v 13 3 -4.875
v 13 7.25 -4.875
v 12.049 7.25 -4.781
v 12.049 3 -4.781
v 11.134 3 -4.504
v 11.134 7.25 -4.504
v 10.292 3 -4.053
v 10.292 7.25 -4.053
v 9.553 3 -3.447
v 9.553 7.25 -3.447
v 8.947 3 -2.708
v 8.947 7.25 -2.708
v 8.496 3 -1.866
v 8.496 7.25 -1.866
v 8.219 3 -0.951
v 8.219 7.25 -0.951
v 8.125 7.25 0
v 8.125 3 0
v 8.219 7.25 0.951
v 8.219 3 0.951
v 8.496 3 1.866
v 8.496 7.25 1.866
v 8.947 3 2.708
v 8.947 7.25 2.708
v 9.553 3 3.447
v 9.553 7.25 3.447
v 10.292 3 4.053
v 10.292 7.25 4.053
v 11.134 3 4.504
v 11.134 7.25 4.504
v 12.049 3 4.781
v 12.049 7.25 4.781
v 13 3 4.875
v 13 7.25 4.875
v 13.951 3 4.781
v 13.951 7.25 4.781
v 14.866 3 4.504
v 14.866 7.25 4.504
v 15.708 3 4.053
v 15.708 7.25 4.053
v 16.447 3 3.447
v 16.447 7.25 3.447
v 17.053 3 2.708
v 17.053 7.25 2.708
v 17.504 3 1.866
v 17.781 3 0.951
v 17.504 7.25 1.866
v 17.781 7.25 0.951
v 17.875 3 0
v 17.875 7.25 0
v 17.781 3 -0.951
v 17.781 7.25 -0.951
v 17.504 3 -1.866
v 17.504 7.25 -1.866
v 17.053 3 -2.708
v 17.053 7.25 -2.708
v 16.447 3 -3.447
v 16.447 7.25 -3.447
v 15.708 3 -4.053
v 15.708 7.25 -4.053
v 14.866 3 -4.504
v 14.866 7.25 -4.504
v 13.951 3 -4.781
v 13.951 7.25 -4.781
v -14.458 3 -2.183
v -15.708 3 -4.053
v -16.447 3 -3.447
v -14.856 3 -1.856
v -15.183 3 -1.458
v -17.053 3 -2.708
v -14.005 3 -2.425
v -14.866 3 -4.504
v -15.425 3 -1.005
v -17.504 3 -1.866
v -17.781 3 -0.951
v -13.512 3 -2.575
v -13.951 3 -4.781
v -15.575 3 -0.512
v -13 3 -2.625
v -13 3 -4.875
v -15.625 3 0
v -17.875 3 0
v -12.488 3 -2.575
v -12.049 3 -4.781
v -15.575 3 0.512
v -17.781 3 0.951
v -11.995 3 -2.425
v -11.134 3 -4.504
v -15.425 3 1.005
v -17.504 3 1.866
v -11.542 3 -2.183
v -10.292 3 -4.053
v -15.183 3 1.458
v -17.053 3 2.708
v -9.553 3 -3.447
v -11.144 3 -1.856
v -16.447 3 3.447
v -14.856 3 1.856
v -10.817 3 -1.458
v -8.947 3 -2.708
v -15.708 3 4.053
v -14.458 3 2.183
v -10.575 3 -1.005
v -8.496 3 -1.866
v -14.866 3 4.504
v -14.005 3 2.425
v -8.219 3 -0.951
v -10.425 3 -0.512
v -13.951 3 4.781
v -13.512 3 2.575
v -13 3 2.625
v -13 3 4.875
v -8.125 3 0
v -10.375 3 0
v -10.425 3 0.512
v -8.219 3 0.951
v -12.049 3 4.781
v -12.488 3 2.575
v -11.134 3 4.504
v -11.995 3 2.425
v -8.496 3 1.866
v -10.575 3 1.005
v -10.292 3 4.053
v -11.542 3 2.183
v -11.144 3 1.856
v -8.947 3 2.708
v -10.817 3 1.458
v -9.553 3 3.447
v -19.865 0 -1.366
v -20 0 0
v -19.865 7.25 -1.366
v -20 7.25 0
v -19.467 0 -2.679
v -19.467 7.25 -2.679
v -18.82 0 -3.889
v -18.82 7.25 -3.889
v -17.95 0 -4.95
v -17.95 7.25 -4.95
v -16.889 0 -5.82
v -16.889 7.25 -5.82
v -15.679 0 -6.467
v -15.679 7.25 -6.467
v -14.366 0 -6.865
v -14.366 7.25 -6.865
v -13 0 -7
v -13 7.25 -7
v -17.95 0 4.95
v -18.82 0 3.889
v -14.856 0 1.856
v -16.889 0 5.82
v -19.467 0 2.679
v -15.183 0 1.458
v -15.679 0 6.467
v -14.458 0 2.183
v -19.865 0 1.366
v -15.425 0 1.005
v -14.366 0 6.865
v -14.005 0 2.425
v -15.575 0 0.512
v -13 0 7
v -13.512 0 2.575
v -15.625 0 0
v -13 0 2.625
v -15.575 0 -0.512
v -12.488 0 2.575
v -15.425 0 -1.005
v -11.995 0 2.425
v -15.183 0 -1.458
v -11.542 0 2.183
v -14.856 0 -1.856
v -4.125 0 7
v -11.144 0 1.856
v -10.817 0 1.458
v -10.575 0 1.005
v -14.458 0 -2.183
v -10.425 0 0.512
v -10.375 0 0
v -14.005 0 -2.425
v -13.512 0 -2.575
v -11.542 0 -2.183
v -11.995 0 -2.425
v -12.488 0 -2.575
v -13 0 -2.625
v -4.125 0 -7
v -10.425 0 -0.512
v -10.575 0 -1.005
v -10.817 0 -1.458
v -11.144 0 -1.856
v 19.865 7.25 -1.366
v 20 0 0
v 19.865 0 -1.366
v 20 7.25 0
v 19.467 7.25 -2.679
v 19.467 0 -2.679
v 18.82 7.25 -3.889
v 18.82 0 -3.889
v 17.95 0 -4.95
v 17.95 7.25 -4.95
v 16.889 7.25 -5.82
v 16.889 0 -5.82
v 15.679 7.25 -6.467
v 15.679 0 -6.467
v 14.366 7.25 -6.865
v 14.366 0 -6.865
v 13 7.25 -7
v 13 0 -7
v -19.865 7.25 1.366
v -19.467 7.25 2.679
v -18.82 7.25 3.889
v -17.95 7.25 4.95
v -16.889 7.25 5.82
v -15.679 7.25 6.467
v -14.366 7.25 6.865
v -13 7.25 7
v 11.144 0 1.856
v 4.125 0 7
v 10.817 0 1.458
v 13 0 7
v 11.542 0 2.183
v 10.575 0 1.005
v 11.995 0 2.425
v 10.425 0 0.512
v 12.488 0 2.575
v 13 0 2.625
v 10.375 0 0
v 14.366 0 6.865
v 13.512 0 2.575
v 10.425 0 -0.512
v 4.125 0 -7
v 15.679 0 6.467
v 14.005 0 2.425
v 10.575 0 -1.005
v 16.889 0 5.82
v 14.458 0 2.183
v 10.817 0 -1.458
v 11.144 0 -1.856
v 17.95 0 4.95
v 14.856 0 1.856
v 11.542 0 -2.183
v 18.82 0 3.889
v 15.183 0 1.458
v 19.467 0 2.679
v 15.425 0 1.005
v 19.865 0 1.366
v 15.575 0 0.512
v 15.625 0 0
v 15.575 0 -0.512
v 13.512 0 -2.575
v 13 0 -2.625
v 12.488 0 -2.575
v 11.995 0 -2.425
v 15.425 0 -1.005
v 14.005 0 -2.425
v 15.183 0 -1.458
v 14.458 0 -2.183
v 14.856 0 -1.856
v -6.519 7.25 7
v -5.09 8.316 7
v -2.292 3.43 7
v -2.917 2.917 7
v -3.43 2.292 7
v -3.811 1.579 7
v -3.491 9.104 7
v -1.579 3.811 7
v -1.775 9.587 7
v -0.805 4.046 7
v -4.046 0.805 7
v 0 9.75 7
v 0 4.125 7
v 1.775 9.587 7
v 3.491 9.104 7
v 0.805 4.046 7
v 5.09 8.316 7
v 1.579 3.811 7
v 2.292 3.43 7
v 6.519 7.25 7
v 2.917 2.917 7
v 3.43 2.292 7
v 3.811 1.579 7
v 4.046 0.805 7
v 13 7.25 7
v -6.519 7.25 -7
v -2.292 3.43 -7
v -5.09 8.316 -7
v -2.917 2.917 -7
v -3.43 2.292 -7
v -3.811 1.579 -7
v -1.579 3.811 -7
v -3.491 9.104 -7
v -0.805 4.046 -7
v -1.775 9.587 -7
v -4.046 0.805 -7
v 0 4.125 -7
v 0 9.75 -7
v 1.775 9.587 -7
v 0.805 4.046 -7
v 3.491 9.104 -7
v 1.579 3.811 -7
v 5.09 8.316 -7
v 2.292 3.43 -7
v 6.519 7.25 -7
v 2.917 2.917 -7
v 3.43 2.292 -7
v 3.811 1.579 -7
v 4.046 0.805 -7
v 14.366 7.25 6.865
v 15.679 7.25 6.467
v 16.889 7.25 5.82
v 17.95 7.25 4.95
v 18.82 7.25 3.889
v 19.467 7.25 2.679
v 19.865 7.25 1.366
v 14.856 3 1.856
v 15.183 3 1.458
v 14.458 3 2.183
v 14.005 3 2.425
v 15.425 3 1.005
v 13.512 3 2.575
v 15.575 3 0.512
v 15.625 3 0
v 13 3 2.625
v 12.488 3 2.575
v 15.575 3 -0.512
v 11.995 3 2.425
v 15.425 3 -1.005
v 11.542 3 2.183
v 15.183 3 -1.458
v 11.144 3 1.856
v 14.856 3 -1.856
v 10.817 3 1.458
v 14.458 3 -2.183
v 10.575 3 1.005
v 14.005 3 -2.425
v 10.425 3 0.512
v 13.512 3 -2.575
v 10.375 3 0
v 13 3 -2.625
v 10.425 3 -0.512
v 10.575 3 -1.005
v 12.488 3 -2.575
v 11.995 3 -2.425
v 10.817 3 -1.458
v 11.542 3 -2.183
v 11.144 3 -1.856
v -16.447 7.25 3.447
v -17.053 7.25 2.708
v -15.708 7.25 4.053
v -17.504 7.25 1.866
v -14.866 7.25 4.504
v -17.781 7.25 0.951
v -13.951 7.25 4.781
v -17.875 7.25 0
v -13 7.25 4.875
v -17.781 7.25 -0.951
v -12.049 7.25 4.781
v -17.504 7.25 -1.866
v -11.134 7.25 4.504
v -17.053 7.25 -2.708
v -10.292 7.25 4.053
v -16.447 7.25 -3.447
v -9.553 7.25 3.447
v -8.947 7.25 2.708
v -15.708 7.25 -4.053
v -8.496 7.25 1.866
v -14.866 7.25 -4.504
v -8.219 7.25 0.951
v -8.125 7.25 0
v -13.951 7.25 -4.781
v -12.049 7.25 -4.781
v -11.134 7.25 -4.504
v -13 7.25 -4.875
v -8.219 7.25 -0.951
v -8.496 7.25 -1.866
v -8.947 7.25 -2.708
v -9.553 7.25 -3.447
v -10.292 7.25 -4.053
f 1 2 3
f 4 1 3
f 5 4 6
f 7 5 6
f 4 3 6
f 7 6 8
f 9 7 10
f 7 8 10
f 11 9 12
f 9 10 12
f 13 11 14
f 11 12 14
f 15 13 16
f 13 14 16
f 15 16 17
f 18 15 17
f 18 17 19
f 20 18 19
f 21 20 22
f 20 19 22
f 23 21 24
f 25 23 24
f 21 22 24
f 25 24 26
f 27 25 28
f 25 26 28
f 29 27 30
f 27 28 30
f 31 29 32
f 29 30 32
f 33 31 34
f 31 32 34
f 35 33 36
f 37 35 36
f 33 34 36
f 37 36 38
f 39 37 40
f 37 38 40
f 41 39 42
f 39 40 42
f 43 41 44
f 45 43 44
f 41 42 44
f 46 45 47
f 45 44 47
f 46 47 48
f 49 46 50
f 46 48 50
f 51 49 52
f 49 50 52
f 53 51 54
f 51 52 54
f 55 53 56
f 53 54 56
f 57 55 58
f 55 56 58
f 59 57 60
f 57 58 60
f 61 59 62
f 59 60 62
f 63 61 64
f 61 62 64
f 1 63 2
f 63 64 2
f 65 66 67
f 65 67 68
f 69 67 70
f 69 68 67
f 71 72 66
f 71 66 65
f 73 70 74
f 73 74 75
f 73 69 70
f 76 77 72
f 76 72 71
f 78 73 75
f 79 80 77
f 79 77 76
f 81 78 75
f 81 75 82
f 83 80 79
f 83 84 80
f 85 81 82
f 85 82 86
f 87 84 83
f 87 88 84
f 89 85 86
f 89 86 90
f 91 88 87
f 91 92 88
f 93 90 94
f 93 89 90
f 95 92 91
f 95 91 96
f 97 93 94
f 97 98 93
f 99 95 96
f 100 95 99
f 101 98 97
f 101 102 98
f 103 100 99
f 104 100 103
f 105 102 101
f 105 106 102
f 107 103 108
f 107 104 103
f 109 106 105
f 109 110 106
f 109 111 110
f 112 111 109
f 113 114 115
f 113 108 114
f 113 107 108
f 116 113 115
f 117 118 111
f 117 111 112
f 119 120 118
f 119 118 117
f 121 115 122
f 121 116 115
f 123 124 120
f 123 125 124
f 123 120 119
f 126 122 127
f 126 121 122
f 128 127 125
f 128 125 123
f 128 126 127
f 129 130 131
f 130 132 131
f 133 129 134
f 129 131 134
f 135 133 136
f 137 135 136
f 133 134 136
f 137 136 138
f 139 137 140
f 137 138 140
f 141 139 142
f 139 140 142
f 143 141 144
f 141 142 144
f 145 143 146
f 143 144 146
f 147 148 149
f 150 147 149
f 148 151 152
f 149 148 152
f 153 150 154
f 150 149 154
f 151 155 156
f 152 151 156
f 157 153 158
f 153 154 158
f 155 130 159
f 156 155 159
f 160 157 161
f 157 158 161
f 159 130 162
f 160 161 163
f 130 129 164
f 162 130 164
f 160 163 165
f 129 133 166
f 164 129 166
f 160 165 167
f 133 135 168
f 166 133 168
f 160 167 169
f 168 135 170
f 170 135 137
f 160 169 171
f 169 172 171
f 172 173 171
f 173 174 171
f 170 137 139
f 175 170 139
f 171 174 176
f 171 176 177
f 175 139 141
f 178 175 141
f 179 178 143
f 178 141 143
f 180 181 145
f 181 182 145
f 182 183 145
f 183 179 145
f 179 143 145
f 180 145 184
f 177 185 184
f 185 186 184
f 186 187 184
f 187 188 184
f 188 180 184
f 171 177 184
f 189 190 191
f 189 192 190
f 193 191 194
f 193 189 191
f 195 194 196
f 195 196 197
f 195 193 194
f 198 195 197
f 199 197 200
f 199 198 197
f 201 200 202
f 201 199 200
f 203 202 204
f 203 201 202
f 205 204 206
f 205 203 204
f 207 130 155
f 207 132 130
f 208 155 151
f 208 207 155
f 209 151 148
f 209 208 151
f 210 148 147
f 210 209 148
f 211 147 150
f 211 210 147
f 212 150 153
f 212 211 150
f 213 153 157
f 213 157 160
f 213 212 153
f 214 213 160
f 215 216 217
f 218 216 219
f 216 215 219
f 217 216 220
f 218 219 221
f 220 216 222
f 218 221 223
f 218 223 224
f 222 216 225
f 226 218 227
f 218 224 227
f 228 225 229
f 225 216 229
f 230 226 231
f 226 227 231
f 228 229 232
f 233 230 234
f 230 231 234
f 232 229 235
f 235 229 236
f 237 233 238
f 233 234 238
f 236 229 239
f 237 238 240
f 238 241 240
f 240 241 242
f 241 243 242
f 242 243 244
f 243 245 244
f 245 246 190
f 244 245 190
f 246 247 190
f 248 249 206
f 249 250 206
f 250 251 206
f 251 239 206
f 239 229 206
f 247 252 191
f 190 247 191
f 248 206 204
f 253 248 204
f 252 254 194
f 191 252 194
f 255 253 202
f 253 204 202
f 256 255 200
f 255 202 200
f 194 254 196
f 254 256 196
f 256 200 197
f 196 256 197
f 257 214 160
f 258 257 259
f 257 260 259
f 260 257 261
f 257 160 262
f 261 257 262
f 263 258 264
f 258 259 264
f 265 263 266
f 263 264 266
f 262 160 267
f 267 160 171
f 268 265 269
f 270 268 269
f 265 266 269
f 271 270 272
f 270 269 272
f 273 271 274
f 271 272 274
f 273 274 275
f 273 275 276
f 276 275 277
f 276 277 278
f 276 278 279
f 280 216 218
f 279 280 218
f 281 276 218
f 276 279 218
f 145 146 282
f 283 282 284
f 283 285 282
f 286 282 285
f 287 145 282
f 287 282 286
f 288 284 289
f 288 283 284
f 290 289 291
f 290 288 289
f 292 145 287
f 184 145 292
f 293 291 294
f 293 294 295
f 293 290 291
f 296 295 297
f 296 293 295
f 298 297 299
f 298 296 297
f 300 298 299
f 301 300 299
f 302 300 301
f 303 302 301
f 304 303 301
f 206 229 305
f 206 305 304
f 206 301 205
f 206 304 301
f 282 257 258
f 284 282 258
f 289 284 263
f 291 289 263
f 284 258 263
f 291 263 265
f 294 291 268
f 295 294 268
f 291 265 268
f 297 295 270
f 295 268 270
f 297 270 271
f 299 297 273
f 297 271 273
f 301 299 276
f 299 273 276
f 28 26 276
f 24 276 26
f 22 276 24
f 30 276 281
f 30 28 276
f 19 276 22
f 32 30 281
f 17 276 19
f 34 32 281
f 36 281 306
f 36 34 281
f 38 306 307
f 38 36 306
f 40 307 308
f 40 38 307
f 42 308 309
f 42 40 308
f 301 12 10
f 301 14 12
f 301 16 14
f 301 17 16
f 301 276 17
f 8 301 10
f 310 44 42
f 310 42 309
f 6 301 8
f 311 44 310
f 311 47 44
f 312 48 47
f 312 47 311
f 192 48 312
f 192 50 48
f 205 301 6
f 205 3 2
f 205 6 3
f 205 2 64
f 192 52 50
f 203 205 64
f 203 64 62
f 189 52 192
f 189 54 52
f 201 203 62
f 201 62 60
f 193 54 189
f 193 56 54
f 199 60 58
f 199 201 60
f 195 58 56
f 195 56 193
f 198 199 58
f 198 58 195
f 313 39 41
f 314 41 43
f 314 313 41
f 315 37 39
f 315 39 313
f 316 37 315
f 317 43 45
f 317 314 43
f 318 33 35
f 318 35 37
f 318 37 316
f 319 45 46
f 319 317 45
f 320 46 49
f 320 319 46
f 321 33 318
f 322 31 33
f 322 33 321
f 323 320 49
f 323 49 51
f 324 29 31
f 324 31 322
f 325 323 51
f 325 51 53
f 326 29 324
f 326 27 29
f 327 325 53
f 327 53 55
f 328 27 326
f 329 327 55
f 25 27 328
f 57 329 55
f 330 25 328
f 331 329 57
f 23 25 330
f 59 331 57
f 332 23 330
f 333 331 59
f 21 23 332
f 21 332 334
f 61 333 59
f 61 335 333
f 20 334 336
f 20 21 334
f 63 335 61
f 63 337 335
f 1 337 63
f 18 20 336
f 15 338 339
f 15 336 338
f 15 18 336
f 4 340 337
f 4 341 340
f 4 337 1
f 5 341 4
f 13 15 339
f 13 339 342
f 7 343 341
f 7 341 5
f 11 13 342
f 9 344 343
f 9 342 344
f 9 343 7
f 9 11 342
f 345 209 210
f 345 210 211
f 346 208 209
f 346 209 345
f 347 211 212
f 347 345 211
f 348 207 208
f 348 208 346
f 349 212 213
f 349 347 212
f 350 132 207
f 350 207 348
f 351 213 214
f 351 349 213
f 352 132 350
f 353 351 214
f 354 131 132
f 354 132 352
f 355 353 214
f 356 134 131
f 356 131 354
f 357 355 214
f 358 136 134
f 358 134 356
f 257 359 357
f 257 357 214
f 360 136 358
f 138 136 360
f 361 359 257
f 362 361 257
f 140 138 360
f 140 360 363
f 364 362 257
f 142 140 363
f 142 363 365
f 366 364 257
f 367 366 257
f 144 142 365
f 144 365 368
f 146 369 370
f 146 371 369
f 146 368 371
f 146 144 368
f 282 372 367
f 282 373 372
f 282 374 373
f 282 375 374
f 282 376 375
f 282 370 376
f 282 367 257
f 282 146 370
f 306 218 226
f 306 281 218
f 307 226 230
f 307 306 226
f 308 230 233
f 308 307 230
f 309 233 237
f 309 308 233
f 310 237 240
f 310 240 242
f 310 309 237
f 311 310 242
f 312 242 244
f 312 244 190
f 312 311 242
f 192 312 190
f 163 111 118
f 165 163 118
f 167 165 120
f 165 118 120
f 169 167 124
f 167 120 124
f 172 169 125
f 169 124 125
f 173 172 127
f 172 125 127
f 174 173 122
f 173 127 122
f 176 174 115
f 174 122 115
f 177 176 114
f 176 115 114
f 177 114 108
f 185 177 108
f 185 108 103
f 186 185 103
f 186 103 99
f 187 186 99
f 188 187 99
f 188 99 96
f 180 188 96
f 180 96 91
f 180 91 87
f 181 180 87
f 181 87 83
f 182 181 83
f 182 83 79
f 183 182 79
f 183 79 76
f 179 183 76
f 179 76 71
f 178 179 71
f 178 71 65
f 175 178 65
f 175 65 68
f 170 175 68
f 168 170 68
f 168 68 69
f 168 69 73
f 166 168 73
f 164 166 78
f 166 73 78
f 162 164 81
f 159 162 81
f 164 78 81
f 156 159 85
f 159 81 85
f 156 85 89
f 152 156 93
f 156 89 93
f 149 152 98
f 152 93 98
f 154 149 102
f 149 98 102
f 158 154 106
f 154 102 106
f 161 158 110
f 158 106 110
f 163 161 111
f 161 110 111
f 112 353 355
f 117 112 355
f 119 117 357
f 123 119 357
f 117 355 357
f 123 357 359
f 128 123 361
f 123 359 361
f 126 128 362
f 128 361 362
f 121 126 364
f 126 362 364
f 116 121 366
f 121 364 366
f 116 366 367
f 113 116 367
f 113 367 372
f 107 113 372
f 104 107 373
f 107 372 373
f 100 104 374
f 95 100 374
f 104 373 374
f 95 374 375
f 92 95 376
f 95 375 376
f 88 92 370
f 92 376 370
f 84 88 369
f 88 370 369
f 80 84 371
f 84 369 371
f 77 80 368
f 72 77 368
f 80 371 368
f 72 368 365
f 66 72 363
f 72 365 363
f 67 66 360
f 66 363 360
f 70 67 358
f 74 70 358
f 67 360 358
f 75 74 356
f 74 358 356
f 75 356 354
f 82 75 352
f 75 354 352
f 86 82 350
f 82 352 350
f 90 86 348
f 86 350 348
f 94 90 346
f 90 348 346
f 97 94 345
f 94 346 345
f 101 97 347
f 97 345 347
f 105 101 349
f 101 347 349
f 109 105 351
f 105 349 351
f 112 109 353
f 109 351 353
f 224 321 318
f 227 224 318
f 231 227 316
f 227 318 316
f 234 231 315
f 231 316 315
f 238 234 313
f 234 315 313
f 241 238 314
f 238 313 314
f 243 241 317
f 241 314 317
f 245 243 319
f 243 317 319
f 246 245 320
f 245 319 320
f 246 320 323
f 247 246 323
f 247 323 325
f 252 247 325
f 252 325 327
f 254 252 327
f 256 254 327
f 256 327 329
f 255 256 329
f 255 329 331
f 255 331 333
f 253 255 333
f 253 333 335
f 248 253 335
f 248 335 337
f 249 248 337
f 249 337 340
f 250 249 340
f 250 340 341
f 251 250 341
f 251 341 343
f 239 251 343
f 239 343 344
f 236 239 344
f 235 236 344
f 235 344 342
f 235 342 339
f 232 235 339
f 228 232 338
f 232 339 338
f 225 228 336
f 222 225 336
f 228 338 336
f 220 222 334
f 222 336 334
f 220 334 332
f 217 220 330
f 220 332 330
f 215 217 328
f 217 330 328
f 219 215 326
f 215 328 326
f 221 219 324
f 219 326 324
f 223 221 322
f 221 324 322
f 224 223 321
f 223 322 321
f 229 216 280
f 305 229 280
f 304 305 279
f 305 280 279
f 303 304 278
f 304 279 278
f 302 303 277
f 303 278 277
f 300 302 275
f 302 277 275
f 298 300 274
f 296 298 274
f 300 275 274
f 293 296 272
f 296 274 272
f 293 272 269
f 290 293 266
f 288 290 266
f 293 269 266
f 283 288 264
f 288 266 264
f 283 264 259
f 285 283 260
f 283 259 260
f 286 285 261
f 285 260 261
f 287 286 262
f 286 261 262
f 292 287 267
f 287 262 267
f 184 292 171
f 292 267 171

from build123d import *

# Parameters (mm, degrees)
SKETCH1_W           = 40
SKETCH1_H           = 14
BOSS_EXTRUDE1_DEPTH = 7.25
FILLET1_R           = 7
SKETCH2_R           = 2.625
CUT_EXTRUDE1_DEPTH  = 23.395591084
SKETCH3_R           = 4.875
CUT_EXTRUDE2_DEPTH  = 4.25
BOSS_EXTRUDE2_DEPTH = 14
SKETCH5_R           = 4.125
CUT_EXTRUDE3_DEPTH  = 27.288067635


with BuildPart() as part:
    # Sketch1 → Boss-Extrude1 (new body)
    with BuildSketch(Plane(origin=(0, 0, 0), x_dir=(1, 0, 0), z_dir=(0, 1, 0))):
        Rectangle(SKETCH1_W, SKETCH1_H)
    extrude(amount=BOSS_EXTRUDE1_DEPTH)

    # Fillet1
    fillet1_edges = [part.edges().sort_by_distance(p)[0] for p in [
        (-20, 3.625, 7),
        (20, 3.625, 7),
        (20, 3.625, -7),
        (-20, 3.625, -7),
    ]]
    fillet(fillet1_edges, radius=FILLET1_R - 0.0001)  # a hair under: the kernel refuses the full size

    # Sketch2 → Cut-Extrude1 (cut, through all)
    with BuildSketch(Plane(origin=(0, 7.25, 0), x_dir=(1, 0, 0), z_dir=(0, 1, 0))):
        with Locations(Location((-13, 0, 0), (0, 0, 270))):
            Circle(SKETCH2_R)
        with Locations(Location((13, 0, 0), (0, 0, 270))):
            Circle(SKETCH2_R)
    extrude(amount=-CUT_EXTRUDE1_DEPTH, mode=Mode.SUBTRACT)

    # Sketch3 → Cut-Extrude2 (cut)
    with BuildSketch(Plane(origin=(0, 7.25, 0), x_dir=(1, 0, 0), z_dir=(0, 1, 0))):
        with Locations(Location((-13, 0, 0), (0, 0, 270))):
            Circle(SKETCH3_R)
        with Locations(Location((13, 0, 0), (0, 0, 90))):
            Circle(SKETCH3_R)
    extrude(amount=-CUT_EXTRUDE2_DEPTH, mode=Mode.SUBTRACT)

    # Sketch4 → Boss-Extrude2 (add)
    with BuildSketch(Plane.XY.offset(7)):
        with BuildLine():
            Line((6.519202405, 7.25), (-6.519202405, 7.25))
            ThreePointArc((-6.519202405, 7.25), (0, 9.75), (6.519202405, 7.25))
        make_face()
    extrude(amount=-BOSS_EXTRUDE2_DEPTH)

    # Sketch5 → Cut-Extrude3 (cut, through all)
    with BuildSketch(Plane.XY.offset(7)):
        Circle(SKETCH5_R)
    extrude(amount=-CUT_EXTRUDE3_DEPTH, mode=Mode.SUBTRACT)


solid = part.part
